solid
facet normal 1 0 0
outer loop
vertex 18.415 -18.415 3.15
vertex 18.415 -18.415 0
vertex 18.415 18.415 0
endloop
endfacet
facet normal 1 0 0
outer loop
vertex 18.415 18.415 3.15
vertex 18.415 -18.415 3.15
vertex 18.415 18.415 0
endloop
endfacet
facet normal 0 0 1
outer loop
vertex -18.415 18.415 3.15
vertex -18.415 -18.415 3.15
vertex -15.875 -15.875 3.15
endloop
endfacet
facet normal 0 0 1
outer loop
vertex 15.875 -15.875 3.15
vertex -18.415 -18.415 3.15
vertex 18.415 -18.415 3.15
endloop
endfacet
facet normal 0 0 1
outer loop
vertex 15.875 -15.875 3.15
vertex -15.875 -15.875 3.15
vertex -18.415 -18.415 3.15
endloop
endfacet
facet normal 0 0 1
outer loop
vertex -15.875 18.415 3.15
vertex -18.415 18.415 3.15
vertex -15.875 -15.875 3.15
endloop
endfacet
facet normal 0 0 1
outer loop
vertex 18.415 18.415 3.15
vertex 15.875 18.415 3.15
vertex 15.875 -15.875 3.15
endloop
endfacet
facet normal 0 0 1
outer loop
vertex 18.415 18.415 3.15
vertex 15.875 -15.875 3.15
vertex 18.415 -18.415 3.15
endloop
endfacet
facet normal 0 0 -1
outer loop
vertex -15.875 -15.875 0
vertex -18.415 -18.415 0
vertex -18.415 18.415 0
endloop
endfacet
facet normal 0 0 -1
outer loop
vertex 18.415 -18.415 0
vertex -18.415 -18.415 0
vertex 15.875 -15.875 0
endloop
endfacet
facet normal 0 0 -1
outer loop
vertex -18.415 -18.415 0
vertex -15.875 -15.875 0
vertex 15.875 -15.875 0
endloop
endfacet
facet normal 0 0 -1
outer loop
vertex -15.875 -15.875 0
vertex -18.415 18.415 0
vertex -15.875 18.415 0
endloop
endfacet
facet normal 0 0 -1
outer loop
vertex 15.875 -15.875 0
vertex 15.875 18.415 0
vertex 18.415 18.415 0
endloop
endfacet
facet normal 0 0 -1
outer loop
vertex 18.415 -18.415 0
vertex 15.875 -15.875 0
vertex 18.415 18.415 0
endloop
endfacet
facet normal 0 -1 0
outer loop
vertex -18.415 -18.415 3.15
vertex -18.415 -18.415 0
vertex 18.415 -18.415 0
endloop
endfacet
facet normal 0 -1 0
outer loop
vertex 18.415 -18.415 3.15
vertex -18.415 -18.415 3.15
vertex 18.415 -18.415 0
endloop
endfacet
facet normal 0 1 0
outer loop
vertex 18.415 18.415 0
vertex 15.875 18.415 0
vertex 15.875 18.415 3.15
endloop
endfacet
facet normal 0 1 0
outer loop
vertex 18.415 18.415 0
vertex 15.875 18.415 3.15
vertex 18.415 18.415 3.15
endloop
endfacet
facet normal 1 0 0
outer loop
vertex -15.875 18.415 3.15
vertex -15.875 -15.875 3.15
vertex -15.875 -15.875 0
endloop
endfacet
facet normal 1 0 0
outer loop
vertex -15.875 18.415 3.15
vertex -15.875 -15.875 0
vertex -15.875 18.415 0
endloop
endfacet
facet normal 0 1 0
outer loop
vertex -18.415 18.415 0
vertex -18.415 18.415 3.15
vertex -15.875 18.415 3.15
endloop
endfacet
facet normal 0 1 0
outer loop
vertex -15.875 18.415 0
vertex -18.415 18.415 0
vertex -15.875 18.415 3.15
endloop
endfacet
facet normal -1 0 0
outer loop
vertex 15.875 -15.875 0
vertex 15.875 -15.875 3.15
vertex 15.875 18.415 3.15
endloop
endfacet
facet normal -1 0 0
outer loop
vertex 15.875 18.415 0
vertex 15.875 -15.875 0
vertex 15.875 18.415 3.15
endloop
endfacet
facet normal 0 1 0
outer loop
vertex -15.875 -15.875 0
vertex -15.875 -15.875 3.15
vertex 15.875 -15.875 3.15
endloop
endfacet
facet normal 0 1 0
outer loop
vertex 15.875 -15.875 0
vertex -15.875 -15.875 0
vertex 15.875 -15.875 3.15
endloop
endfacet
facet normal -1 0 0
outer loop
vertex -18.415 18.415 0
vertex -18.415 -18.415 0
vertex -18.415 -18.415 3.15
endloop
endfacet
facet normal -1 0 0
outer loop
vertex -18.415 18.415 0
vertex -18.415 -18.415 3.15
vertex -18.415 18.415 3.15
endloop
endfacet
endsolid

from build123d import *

# Parameters (mm, degrees)
F0_W     = 36.83
F0_H     = 36.83
F1_DEPTH = 3.1496
F2_W     = 31.75
F2_H     = 31.75
F3_DEPTH = 25.4
F4_W     = 31.75
F4_H     = 2.54
F5_DEPTH = 25.4


with BuildPart() as f1:
    # F0 (on Top) → F1 (new body)
    with BuildSketch(Plane.XY):
        Rectangle(F0_W, F0_H)
    extrude(amount=F1_DEPTH)

    # F2 (on face) → F3 (cut)
    with BuildSketch(Plane.XY.offset(3.1496)):
        Rectangle(F2_W, F2_H)
    extrude(amount=-F3_DEPTH, mode=Mode.SUBTRACT)

    # F4 (on face) → F5 (cut)
    with BuildSketch(Plane.XY.offset(3.1496)):
        with Locations((0, 17.145)):
            Rectangle(F4_W, F4_H)
    extrude(amount=-F5_DEPTH, mode=Mode.SUBTRACT)


solid = f1.part
